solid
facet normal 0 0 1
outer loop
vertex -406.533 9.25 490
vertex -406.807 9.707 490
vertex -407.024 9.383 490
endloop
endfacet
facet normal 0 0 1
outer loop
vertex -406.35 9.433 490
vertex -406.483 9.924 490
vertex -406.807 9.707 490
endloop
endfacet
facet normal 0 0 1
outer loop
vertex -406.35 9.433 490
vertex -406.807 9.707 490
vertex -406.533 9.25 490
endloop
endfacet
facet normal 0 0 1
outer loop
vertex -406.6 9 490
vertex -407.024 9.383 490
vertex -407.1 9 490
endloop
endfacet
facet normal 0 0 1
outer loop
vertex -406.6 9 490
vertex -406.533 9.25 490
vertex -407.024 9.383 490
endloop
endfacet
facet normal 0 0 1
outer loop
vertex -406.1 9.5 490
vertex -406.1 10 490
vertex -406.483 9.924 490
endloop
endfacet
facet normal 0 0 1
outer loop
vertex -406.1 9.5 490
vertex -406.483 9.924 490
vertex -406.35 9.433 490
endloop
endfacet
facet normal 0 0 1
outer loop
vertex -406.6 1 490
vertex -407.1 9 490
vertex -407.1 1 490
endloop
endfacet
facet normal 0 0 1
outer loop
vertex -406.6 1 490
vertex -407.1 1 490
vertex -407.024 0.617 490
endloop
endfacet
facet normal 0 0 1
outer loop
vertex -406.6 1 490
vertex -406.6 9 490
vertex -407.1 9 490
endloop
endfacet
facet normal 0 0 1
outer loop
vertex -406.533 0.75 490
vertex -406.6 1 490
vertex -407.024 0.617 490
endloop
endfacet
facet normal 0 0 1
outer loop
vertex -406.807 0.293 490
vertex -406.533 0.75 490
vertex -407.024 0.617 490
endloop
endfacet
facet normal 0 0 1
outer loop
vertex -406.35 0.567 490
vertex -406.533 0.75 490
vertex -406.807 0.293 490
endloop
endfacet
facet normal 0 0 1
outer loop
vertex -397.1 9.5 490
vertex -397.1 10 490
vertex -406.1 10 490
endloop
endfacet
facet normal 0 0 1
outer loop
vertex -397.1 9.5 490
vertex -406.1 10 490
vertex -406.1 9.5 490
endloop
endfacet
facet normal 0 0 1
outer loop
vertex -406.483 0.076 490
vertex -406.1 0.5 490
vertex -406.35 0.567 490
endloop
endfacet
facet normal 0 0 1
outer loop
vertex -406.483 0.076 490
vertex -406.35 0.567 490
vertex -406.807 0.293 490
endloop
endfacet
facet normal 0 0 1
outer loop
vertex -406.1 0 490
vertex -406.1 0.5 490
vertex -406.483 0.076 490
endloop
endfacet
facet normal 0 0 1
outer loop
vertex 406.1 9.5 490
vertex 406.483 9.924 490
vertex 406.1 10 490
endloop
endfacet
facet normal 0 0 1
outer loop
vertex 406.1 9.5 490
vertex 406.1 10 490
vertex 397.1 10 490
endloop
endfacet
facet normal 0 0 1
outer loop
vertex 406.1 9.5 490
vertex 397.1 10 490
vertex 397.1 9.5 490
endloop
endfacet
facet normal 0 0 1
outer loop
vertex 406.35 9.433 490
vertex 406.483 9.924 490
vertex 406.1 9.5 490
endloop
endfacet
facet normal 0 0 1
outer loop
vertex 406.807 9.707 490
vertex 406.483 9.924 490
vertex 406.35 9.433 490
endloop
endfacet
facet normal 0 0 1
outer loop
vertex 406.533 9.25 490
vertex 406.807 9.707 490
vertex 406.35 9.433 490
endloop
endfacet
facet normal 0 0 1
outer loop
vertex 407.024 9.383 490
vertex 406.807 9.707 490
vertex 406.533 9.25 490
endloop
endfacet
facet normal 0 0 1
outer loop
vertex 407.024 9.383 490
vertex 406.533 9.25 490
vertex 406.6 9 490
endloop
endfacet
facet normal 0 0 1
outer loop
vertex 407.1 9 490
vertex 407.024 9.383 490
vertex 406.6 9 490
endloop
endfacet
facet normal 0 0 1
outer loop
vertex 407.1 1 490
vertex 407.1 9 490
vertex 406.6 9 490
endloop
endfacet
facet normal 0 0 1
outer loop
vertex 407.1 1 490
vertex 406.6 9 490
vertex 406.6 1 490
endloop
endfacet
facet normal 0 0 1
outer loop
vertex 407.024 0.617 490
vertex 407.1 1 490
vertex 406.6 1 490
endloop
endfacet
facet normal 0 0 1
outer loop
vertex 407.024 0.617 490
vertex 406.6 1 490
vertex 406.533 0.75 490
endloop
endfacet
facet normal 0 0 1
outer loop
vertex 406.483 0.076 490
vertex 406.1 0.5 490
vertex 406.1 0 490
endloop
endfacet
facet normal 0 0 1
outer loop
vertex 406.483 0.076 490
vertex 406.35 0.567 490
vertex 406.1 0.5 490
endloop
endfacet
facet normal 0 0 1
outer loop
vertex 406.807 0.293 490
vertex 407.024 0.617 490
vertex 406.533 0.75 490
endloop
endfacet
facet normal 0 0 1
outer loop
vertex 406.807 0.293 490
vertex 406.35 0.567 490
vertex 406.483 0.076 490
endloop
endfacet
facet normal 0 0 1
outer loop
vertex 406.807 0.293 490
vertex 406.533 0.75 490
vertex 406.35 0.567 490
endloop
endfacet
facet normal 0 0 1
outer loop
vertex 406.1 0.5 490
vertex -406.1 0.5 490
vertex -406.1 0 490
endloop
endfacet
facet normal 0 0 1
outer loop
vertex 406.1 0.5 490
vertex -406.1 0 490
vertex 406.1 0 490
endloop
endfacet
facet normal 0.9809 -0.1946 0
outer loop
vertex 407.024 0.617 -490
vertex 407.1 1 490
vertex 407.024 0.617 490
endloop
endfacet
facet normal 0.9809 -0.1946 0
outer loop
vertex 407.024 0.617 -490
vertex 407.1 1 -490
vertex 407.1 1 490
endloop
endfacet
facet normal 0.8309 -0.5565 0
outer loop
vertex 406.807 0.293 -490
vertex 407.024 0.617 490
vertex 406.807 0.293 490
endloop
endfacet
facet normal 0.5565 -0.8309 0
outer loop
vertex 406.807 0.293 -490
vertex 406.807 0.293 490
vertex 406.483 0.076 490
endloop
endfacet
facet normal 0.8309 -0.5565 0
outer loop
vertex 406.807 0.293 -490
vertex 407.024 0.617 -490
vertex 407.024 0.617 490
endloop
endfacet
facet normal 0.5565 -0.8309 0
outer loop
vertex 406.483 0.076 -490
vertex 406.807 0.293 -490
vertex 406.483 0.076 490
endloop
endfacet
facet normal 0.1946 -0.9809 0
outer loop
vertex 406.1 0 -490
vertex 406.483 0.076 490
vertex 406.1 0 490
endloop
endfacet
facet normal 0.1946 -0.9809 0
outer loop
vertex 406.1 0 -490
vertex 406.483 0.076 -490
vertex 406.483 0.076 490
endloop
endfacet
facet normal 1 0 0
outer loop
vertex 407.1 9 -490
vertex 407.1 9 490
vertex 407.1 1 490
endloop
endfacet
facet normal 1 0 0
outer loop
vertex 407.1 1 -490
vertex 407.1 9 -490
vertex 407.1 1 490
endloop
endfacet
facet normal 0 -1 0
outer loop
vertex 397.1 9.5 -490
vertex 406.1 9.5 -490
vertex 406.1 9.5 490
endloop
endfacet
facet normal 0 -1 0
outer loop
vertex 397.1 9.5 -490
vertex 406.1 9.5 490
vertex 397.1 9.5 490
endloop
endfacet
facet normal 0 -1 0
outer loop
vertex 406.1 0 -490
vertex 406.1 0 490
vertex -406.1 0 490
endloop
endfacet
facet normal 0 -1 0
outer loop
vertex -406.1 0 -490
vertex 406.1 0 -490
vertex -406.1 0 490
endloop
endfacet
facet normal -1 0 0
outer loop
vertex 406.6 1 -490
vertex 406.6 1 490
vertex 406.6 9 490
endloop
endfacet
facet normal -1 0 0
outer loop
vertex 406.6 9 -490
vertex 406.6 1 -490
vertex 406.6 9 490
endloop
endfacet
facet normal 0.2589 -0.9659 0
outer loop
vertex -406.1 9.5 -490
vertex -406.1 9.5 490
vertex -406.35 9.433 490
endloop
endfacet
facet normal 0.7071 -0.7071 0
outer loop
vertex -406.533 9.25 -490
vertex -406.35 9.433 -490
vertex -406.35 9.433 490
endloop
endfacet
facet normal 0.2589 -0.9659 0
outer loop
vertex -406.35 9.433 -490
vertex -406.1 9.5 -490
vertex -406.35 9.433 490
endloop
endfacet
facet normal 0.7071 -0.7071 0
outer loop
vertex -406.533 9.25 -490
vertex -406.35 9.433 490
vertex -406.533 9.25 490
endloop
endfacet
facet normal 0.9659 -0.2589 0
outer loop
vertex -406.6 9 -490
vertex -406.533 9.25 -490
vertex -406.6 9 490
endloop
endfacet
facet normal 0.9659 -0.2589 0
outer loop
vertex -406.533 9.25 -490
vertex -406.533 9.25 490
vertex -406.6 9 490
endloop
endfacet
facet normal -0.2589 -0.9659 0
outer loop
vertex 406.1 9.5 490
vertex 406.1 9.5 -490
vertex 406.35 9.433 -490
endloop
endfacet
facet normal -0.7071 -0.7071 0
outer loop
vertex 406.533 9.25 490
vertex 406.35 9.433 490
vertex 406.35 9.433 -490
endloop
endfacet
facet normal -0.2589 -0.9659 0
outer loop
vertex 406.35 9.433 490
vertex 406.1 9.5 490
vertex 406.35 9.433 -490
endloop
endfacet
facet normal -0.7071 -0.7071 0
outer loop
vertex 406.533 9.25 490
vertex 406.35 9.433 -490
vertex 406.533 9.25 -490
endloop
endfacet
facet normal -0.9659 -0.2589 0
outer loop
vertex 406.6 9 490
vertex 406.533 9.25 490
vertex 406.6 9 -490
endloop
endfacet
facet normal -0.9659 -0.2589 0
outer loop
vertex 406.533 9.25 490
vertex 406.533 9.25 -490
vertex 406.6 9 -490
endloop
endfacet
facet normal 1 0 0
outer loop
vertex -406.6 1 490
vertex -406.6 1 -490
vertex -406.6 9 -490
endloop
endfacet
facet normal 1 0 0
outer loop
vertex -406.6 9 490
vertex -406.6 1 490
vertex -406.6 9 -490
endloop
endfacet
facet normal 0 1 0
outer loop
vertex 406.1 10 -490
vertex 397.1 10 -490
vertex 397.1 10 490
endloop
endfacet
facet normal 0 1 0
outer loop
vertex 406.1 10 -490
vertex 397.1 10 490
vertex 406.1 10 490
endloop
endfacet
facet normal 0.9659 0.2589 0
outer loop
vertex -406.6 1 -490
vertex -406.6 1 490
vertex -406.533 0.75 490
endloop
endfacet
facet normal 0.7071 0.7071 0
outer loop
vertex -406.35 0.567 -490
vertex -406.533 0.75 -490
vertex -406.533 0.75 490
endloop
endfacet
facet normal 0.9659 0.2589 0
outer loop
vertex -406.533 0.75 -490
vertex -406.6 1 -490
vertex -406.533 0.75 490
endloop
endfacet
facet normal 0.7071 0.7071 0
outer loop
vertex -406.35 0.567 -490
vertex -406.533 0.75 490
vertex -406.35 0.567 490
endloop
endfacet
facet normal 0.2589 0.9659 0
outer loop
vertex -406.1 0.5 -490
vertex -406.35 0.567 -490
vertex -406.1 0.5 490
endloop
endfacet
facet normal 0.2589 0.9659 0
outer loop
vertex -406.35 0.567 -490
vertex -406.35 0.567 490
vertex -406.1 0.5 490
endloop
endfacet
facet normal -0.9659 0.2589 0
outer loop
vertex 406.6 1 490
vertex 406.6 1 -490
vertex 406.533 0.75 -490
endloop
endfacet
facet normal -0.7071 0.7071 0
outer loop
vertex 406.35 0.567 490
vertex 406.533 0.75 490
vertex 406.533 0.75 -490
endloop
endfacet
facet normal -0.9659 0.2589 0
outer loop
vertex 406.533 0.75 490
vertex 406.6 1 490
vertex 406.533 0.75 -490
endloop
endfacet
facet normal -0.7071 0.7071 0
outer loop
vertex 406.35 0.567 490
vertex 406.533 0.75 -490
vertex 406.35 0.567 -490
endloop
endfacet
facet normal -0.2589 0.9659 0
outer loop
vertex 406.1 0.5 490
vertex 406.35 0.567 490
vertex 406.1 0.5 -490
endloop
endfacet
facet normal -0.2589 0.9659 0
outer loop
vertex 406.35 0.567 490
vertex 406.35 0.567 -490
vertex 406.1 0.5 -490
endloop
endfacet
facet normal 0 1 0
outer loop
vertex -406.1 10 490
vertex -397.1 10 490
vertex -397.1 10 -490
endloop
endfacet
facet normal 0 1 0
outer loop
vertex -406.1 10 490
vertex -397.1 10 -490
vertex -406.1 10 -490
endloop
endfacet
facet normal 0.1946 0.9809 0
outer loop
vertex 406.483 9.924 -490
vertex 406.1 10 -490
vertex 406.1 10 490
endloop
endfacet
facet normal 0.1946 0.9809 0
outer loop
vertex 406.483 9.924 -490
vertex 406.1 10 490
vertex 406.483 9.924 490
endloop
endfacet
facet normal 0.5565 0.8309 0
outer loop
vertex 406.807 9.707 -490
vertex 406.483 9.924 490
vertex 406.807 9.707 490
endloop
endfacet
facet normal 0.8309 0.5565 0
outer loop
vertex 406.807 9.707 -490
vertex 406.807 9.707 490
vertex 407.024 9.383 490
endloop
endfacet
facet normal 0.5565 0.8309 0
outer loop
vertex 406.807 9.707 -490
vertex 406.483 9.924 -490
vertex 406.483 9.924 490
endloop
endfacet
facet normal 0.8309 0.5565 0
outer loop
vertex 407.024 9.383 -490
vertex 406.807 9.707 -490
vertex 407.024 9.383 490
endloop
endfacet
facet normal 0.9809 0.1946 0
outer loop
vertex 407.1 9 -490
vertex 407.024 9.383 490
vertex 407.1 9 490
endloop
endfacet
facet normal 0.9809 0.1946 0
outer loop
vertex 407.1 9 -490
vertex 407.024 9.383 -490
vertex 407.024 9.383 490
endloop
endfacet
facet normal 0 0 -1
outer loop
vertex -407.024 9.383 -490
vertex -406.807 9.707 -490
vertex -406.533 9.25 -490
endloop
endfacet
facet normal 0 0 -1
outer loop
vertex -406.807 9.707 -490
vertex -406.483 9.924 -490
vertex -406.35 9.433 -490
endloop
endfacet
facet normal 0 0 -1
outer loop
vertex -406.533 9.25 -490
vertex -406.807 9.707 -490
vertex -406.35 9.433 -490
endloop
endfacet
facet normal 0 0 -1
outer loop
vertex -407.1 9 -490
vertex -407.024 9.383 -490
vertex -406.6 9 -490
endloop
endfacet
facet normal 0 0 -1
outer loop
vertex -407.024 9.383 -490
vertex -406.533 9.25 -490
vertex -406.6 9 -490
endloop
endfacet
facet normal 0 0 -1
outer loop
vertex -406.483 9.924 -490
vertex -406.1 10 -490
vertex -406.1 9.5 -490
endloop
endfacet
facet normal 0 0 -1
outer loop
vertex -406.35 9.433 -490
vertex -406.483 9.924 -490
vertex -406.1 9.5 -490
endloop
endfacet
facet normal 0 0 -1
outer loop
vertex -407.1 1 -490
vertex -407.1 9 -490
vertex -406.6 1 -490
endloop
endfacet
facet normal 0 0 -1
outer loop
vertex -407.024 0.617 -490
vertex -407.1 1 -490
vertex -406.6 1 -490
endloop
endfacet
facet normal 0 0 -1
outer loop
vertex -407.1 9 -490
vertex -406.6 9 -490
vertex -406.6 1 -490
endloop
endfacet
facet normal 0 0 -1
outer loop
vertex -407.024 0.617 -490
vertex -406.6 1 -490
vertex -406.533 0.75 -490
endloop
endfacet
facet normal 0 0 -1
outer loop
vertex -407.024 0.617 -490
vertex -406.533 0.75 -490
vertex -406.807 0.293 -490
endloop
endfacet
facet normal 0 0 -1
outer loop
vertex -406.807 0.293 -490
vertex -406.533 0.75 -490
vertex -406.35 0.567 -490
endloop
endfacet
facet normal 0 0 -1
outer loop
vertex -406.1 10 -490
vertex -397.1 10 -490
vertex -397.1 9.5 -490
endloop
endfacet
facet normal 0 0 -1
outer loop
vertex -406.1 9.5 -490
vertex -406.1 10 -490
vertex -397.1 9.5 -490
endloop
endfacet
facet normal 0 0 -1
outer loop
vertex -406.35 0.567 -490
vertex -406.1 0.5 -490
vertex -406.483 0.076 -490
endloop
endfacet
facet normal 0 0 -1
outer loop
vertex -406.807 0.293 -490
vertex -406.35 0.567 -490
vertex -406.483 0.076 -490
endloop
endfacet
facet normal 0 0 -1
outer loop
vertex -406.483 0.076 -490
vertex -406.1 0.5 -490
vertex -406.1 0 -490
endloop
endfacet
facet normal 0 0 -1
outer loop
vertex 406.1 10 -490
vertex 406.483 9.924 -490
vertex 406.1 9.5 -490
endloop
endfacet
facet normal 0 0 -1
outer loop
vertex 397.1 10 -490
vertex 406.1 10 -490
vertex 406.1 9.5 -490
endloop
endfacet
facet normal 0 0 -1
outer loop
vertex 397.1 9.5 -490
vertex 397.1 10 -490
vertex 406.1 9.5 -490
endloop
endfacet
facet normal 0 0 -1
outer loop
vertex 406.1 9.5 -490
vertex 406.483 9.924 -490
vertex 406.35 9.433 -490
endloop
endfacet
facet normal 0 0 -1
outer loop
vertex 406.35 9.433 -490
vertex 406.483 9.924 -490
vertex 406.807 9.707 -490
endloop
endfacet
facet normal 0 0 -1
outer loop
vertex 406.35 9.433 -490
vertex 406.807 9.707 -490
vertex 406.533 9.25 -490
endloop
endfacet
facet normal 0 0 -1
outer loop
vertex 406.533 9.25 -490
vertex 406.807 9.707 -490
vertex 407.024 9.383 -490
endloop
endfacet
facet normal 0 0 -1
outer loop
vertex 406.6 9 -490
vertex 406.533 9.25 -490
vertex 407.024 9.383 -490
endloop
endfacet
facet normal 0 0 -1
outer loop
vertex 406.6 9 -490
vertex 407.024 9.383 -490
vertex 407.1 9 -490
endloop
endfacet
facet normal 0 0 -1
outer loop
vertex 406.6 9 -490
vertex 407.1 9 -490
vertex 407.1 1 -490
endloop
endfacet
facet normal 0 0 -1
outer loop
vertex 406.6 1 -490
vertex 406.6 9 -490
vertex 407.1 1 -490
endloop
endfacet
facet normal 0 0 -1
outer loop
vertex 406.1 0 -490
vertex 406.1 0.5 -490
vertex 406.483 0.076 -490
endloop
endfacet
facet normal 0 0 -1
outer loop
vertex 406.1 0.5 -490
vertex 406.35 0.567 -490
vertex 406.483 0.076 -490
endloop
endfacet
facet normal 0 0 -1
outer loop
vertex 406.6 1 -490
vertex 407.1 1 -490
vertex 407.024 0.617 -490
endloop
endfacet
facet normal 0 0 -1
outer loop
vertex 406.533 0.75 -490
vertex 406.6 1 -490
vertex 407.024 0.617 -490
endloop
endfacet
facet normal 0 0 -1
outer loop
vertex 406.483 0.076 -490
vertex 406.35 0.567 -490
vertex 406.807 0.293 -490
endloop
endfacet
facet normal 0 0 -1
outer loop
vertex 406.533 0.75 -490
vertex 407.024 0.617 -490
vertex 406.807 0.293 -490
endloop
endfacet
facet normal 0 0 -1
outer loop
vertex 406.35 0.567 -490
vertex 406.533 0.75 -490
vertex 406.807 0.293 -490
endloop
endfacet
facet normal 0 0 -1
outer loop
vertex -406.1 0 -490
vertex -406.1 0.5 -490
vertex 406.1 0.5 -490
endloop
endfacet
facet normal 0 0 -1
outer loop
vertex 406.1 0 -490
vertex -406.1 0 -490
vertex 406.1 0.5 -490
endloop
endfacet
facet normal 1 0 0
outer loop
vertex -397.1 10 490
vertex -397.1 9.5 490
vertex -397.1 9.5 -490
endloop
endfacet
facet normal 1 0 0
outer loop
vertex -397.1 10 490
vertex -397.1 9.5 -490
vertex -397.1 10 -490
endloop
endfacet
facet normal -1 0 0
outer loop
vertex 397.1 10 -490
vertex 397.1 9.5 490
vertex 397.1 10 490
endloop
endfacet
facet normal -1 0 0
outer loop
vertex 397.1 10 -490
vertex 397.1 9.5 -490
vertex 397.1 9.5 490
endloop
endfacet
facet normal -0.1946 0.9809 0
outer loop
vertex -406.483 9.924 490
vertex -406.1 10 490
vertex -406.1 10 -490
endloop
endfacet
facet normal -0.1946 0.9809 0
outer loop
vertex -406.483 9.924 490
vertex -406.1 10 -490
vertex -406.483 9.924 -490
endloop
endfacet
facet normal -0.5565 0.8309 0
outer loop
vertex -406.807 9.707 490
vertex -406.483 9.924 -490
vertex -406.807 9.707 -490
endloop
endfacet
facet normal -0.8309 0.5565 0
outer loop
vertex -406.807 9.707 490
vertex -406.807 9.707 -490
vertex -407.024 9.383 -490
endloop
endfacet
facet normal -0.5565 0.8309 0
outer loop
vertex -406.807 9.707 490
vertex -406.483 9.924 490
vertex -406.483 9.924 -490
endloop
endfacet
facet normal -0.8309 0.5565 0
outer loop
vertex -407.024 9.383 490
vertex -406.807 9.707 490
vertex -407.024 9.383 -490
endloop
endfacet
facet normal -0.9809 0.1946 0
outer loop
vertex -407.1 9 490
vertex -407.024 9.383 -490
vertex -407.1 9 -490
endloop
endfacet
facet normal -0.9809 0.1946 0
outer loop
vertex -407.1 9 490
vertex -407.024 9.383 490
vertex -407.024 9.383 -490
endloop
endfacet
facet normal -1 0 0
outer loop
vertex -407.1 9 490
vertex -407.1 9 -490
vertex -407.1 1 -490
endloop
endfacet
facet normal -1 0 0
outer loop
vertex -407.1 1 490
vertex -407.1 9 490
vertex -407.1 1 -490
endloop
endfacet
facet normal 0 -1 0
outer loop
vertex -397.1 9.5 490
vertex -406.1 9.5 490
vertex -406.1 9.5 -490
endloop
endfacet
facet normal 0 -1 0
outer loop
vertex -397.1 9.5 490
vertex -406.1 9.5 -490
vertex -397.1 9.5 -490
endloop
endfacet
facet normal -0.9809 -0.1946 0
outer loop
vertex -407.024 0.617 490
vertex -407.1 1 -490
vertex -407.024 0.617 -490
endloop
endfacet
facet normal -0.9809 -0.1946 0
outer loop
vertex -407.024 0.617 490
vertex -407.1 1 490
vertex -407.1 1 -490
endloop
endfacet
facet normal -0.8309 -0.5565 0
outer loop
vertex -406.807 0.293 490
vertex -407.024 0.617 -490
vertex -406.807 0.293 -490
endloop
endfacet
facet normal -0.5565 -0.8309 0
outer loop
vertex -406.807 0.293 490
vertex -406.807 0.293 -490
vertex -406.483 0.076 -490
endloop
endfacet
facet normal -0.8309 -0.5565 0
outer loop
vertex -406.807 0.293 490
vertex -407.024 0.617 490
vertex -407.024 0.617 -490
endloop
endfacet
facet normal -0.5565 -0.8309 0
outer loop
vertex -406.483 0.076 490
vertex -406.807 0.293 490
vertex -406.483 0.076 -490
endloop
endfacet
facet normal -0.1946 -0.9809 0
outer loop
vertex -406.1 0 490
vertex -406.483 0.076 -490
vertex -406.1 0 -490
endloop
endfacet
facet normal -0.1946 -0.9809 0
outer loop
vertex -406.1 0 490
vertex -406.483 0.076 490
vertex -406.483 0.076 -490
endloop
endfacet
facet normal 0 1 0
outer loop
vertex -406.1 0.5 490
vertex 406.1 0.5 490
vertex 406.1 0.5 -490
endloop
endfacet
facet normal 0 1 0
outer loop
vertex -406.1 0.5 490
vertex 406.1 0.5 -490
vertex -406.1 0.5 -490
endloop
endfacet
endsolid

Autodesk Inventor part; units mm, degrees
ref_plane "YZ Plane" through (0, 0, 0) normal (1, 0, 0) x (0, 1, 0)
ref_plane "XZ Plane" through (0, 0, 0) normal (0, 1, 0) x (-1, 0, 0)
ref_plane "XY Plane" through (0, 0, 0) normal (0, 0, 1) x (1, 0, 0)
sketch "Sketch6" plane through (0, 0, 0) normal (0, 1, 0) x (-1, 0, 0)
  line L0 (407.1, -490) -> (-407.1, -490)
  line L1 (-407.1, -490) -> (-407.1, 490)
  line L2 (-407.1, 490) -> (407.1, 490)
  line L3 (407.1, 490) -> (407.1, -490)
  line L4 (407.1, -490) -> (-407.1, 490) construction
  line L5 (-407.1, -490) -> (407.1, 490) construction
  point P0 (0, 0)
  dimension "d52" = 814.2
  dimension "d53" = 980
extrude "Plate2" add sketch "Sketch6" along normal blind 0.5
sketch "Sketch11" plane through (406.6, 0, -490) normal (1, 0, 0) x (0, 1, 0)
  line L0 (0, 980) -> (0, 0)
  line L1 (0, 0) -> (10, 0)
  line L2 (10, 0) -> (10, 980)
  line L3 (10, 980) -> (0, 980)
edge flange "Flange2" height 10 angle 90 thickness 0.5 bend radius 0.5 thickness toward (1, 0, 0) relief tear relief width 0.5 relief depth 0.25 edges at (407.1, 0.5, 0) wall of the first edge with corners at (406.6, 0, 490) (406.6, 0, -490) (406.6, 10, -490) (406.6, 10, 490)
bend "Bend3"
corner "Corner3"
sketch "Sketch12" plane through (407.1, 9.5, -490) normal (0, 1, 0) x (-1, 0, 0)
  line L0 (0, 980) -> (0, 0)
  line L1 (0, 0) -> (10, 0)
  line L2 (10, 0) -> (10, 980)
  line L3 (10, 980) -> (0, 980)
edge flange "Flange3" height 10 angle 90 thickness 0.5 bend radius 0.5 thickness toward (0, 1, 0) relief tear relief width 0.5 relief depth 0.25 edges at (406.6, 10, 0) wall of the first edge with corners at (407.1, 9.5, 490) (407.1, 9.5, -490) (397.1, 9.5, -490) (397.1, 9.5, 490)
bend "Bend4"
corner "Corner4"
sketch "Sketch13" plane through (-406.6, 0, 490) normal (-1, 0, 0) x (0, -1, 0)
  line L0 (0, -980) -> (0, 0)
  line L1 (0, 0) -> (-10, 0)
  line L2 (-10, 0) -> (-10, -980)
  line L3 (-10, -980) -> (0, -980)
edge flange "Flange4" height 10 angle 90 thickness 0.5 bend radius 0.5 thickness toward (-1, 0, 0) relief tear relief width 0.5 relief depth 0.25 edges at (-407.1, 0.5, 0) wall of the first edge with corners at (-406.6, 0, -490) (-406.6, 0, 490) (-406.6, 10, 490) (-406.6, 10, -490)
bend "Bend5"
corner "Corner5"
sketch "Sketch14" plane through (-407.1, 9.5, 490) normal (0, 1, 0) x (-1, 0, 0)
  line L0 (0, -980) -> (0, 0)
  line L1 (0, 0) -> (-10, 0)
  line L2 (-10, 0) -> (-10, -980)
  line L3 (-10, -980) -> (0, -980)
edge flange "Flange5" height 10 angle 90 thickness 0.5 bend radius 0.5 thickness toward (0, 1, 0) relief tear relief width 0.5 relief depth 0.25 edges at (-406.6, 10, 0) wall of the first edge with corners at (-407.1, 9.5, -490) (-407.1, 9.5, 490) (-397.1, 9.5, 490) (-397.1, 9.5, -490)
bend "Bend6"
corner "Corner6"
equation "\"d52\" = ЖАБРЫ_базовая_ширина - ЖАБРЫ_шаг_листов"
equation "\"d53\" = ЖАБРЫ_базовая_длина_кор_лист"
equation "\"d54\" = Thickness"
equation "\"d84\" = BendReliefWidth"
equation "\"d85\" = BendReliefDepth"
equation "\"d86\" = MinimumRemnant"
equation "\"d87\" = TransitionRadius"
equation "\"d90\" = BendRadius"
equation "\"d91\" = CornerReliefSize"
equation "\"d92\" = GapSize"
equation "\"d93\" = JacobiRadiusSize"
equation "\"d94\" = BendReliefWidth"
equation "\"d95\" = BendReliefDepth"
equation "\"d96\" = MinimumRemnant"
equation "\"d97\" = TransitionRadius"
equation "\"d100\" = BendRadius"
equation "\"d101\" = CornerReliefSize"
equation "\"d102\" = GapSize"
equation "\"d103\" = JacobiRadiusSize"
equation "\"d104\" = BendReliefWidth"
equation "\"d105\" = BendReliefDepth"
equation "\"d106\" = MinimumRemnant"
equation "\"d107\" = TransitionRadius"
equation "\"d110\" = BendRadius"
equation "\"d111\" = CornerReliefSize"
equation "\"d112\" = GapSize"
equation "\"d113\" = JacobiRadiusSize"
equation "\"d114\" = BendReliefWidth"
equation "\"d115\" = BendReliefDepth"
equation "\"d116\" = MinimumRemnant"
equation "\"d117\" = TransitionRadius"
equation "\"d120\" = BendRadius"
equation "\"d121\" = CornerReliefSize"
equation "\"d122\" = GapSize"
equation "\"d123\" = JacobiRadiusSize"
equation "\"BendRadius\" = Thickness"
equation "\"BendReliefWidth\" = Thickness"
equation "\"BendReliefDepth\" = 0.5 * Thickness"
equation "\"CornerReliefSize\" = 4 * Thickness"
equation "\"MinimumRemnant\" = 2 * Thickness"
equation "\"TransitionRadius\" = BendRadius"
equation "\"JacobiRadiusSize\" = BendRadius"
equation "\"GapSize\" = Thickness"
equation "\"ЖАБРЫ_базовая_ширина\" = 915"
equation "\"ЖАБРЫ_шаг_листов\" = 100.8"
equation "\"ЖАБРЫ_базовая_длина_кор_лист\" = 980"
equation "\"Thickness\" = 0.5"
properties part number "MSC 803 sheet gills" material "Stainless Steel"
